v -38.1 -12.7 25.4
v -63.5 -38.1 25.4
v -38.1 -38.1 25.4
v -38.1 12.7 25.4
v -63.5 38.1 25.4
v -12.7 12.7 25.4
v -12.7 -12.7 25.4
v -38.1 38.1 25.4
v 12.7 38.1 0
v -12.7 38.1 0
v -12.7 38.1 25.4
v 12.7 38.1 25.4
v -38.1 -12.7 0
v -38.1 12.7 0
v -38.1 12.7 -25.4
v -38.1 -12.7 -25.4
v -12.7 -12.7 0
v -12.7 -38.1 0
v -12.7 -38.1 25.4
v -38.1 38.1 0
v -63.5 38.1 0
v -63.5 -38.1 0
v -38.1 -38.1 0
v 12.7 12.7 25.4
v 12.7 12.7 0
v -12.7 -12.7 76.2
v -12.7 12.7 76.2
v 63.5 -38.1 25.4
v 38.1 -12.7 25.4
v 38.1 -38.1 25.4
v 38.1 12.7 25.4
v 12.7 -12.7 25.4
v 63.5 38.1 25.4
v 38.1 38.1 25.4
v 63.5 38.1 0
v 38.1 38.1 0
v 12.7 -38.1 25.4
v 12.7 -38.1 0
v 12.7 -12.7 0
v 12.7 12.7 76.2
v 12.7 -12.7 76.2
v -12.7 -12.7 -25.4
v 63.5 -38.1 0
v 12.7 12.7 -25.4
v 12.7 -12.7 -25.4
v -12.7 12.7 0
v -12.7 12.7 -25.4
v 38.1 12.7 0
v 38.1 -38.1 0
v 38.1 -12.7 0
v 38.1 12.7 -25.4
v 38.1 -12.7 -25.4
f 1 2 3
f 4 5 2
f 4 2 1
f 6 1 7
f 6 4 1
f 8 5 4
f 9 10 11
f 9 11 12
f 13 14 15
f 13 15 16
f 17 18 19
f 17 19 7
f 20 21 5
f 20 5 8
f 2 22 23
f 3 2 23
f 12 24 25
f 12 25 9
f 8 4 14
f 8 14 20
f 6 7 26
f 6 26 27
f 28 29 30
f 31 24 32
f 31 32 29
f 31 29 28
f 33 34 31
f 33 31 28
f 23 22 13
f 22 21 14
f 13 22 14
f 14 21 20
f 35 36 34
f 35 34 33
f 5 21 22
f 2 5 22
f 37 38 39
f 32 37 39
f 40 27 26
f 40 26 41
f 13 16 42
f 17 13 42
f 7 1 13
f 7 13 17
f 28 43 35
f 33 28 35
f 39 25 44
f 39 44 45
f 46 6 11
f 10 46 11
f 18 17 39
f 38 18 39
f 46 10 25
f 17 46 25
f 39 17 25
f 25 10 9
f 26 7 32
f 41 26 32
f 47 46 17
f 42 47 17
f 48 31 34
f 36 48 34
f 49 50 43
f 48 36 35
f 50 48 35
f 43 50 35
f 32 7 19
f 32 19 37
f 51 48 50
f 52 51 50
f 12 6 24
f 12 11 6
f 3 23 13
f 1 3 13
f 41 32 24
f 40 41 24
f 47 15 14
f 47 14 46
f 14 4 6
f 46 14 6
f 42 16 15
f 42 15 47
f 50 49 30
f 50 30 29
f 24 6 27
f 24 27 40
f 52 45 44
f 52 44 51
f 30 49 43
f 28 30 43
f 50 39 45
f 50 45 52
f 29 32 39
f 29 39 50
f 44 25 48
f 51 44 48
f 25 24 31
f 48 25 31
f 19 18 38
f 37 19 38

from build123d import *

# Parameters (mm, degrees)
F0_W     = 25.4
F0_H     = 25.4
F1_DEPTH = 25.4
F2_W     = 25.4
F2_H     = 25.4
F3_DEPTH = 50.8
F4_W     = 25.4
F4_H     = 25.4
F5_DEPTH = 25.4


with BuildPart() as f1:
    # F0 (on Top) → F1 (new body)
    with BuildSketch(Plane.XY):
        Polygon((63.5, -12.7), (63.5, 12.7), (38.1, 12.7), (12.7, 12.7), (-12.7, 12.7), (-38.1, 12.7), (-63.5, 12.7), (-63.5, -12.7), (-38.1, -12.7), (-12.7, -12.7), (12.7, -12.7), (38.1, -12.7), align=None)
        with Locations((50.8, 25.4)):
            Rectangle(F0_W, F0_H)
        with Locations((50.8, -25.4)):
            Rectangle(F0_W, F0_H)
        with Locations((0, 25.4)):
            Rectangle(F0_W, F0_H)
        with Locations((0, -25.4)):
            Rectangle(F0_W, F0_H)
        with Locations((-50.8, 25.4)):
            Rectangle(F0_W, F0_H)
        with Locations((-50.8, -25.4)):
            Rectangle(F0_W, F0_H)
    extrude(amount=F1_DEPTH)

    # F2 (on face) → F3 (join)
    with BuildSketch(Plane.XY.offset(25.4)):
        Rectangle(F2_W, F2_H)
    extrude(amount=F3_DEPTH)

    # F4 (on face) → F5 (join)
    with BuildSketch(Plane(origin=(0, 0, 0), x_dir=(1, 0, 0), z_dir=(0, 0, -1))):
        with Locations((-25.4, 0)):
            Rectangle(F4_W, F4_H)
        with Locations((25.4, 0)):
            Rectangle(F4_W, F4_H)
    extrude(amount=F5_DEPTH)


solid = f1.part
